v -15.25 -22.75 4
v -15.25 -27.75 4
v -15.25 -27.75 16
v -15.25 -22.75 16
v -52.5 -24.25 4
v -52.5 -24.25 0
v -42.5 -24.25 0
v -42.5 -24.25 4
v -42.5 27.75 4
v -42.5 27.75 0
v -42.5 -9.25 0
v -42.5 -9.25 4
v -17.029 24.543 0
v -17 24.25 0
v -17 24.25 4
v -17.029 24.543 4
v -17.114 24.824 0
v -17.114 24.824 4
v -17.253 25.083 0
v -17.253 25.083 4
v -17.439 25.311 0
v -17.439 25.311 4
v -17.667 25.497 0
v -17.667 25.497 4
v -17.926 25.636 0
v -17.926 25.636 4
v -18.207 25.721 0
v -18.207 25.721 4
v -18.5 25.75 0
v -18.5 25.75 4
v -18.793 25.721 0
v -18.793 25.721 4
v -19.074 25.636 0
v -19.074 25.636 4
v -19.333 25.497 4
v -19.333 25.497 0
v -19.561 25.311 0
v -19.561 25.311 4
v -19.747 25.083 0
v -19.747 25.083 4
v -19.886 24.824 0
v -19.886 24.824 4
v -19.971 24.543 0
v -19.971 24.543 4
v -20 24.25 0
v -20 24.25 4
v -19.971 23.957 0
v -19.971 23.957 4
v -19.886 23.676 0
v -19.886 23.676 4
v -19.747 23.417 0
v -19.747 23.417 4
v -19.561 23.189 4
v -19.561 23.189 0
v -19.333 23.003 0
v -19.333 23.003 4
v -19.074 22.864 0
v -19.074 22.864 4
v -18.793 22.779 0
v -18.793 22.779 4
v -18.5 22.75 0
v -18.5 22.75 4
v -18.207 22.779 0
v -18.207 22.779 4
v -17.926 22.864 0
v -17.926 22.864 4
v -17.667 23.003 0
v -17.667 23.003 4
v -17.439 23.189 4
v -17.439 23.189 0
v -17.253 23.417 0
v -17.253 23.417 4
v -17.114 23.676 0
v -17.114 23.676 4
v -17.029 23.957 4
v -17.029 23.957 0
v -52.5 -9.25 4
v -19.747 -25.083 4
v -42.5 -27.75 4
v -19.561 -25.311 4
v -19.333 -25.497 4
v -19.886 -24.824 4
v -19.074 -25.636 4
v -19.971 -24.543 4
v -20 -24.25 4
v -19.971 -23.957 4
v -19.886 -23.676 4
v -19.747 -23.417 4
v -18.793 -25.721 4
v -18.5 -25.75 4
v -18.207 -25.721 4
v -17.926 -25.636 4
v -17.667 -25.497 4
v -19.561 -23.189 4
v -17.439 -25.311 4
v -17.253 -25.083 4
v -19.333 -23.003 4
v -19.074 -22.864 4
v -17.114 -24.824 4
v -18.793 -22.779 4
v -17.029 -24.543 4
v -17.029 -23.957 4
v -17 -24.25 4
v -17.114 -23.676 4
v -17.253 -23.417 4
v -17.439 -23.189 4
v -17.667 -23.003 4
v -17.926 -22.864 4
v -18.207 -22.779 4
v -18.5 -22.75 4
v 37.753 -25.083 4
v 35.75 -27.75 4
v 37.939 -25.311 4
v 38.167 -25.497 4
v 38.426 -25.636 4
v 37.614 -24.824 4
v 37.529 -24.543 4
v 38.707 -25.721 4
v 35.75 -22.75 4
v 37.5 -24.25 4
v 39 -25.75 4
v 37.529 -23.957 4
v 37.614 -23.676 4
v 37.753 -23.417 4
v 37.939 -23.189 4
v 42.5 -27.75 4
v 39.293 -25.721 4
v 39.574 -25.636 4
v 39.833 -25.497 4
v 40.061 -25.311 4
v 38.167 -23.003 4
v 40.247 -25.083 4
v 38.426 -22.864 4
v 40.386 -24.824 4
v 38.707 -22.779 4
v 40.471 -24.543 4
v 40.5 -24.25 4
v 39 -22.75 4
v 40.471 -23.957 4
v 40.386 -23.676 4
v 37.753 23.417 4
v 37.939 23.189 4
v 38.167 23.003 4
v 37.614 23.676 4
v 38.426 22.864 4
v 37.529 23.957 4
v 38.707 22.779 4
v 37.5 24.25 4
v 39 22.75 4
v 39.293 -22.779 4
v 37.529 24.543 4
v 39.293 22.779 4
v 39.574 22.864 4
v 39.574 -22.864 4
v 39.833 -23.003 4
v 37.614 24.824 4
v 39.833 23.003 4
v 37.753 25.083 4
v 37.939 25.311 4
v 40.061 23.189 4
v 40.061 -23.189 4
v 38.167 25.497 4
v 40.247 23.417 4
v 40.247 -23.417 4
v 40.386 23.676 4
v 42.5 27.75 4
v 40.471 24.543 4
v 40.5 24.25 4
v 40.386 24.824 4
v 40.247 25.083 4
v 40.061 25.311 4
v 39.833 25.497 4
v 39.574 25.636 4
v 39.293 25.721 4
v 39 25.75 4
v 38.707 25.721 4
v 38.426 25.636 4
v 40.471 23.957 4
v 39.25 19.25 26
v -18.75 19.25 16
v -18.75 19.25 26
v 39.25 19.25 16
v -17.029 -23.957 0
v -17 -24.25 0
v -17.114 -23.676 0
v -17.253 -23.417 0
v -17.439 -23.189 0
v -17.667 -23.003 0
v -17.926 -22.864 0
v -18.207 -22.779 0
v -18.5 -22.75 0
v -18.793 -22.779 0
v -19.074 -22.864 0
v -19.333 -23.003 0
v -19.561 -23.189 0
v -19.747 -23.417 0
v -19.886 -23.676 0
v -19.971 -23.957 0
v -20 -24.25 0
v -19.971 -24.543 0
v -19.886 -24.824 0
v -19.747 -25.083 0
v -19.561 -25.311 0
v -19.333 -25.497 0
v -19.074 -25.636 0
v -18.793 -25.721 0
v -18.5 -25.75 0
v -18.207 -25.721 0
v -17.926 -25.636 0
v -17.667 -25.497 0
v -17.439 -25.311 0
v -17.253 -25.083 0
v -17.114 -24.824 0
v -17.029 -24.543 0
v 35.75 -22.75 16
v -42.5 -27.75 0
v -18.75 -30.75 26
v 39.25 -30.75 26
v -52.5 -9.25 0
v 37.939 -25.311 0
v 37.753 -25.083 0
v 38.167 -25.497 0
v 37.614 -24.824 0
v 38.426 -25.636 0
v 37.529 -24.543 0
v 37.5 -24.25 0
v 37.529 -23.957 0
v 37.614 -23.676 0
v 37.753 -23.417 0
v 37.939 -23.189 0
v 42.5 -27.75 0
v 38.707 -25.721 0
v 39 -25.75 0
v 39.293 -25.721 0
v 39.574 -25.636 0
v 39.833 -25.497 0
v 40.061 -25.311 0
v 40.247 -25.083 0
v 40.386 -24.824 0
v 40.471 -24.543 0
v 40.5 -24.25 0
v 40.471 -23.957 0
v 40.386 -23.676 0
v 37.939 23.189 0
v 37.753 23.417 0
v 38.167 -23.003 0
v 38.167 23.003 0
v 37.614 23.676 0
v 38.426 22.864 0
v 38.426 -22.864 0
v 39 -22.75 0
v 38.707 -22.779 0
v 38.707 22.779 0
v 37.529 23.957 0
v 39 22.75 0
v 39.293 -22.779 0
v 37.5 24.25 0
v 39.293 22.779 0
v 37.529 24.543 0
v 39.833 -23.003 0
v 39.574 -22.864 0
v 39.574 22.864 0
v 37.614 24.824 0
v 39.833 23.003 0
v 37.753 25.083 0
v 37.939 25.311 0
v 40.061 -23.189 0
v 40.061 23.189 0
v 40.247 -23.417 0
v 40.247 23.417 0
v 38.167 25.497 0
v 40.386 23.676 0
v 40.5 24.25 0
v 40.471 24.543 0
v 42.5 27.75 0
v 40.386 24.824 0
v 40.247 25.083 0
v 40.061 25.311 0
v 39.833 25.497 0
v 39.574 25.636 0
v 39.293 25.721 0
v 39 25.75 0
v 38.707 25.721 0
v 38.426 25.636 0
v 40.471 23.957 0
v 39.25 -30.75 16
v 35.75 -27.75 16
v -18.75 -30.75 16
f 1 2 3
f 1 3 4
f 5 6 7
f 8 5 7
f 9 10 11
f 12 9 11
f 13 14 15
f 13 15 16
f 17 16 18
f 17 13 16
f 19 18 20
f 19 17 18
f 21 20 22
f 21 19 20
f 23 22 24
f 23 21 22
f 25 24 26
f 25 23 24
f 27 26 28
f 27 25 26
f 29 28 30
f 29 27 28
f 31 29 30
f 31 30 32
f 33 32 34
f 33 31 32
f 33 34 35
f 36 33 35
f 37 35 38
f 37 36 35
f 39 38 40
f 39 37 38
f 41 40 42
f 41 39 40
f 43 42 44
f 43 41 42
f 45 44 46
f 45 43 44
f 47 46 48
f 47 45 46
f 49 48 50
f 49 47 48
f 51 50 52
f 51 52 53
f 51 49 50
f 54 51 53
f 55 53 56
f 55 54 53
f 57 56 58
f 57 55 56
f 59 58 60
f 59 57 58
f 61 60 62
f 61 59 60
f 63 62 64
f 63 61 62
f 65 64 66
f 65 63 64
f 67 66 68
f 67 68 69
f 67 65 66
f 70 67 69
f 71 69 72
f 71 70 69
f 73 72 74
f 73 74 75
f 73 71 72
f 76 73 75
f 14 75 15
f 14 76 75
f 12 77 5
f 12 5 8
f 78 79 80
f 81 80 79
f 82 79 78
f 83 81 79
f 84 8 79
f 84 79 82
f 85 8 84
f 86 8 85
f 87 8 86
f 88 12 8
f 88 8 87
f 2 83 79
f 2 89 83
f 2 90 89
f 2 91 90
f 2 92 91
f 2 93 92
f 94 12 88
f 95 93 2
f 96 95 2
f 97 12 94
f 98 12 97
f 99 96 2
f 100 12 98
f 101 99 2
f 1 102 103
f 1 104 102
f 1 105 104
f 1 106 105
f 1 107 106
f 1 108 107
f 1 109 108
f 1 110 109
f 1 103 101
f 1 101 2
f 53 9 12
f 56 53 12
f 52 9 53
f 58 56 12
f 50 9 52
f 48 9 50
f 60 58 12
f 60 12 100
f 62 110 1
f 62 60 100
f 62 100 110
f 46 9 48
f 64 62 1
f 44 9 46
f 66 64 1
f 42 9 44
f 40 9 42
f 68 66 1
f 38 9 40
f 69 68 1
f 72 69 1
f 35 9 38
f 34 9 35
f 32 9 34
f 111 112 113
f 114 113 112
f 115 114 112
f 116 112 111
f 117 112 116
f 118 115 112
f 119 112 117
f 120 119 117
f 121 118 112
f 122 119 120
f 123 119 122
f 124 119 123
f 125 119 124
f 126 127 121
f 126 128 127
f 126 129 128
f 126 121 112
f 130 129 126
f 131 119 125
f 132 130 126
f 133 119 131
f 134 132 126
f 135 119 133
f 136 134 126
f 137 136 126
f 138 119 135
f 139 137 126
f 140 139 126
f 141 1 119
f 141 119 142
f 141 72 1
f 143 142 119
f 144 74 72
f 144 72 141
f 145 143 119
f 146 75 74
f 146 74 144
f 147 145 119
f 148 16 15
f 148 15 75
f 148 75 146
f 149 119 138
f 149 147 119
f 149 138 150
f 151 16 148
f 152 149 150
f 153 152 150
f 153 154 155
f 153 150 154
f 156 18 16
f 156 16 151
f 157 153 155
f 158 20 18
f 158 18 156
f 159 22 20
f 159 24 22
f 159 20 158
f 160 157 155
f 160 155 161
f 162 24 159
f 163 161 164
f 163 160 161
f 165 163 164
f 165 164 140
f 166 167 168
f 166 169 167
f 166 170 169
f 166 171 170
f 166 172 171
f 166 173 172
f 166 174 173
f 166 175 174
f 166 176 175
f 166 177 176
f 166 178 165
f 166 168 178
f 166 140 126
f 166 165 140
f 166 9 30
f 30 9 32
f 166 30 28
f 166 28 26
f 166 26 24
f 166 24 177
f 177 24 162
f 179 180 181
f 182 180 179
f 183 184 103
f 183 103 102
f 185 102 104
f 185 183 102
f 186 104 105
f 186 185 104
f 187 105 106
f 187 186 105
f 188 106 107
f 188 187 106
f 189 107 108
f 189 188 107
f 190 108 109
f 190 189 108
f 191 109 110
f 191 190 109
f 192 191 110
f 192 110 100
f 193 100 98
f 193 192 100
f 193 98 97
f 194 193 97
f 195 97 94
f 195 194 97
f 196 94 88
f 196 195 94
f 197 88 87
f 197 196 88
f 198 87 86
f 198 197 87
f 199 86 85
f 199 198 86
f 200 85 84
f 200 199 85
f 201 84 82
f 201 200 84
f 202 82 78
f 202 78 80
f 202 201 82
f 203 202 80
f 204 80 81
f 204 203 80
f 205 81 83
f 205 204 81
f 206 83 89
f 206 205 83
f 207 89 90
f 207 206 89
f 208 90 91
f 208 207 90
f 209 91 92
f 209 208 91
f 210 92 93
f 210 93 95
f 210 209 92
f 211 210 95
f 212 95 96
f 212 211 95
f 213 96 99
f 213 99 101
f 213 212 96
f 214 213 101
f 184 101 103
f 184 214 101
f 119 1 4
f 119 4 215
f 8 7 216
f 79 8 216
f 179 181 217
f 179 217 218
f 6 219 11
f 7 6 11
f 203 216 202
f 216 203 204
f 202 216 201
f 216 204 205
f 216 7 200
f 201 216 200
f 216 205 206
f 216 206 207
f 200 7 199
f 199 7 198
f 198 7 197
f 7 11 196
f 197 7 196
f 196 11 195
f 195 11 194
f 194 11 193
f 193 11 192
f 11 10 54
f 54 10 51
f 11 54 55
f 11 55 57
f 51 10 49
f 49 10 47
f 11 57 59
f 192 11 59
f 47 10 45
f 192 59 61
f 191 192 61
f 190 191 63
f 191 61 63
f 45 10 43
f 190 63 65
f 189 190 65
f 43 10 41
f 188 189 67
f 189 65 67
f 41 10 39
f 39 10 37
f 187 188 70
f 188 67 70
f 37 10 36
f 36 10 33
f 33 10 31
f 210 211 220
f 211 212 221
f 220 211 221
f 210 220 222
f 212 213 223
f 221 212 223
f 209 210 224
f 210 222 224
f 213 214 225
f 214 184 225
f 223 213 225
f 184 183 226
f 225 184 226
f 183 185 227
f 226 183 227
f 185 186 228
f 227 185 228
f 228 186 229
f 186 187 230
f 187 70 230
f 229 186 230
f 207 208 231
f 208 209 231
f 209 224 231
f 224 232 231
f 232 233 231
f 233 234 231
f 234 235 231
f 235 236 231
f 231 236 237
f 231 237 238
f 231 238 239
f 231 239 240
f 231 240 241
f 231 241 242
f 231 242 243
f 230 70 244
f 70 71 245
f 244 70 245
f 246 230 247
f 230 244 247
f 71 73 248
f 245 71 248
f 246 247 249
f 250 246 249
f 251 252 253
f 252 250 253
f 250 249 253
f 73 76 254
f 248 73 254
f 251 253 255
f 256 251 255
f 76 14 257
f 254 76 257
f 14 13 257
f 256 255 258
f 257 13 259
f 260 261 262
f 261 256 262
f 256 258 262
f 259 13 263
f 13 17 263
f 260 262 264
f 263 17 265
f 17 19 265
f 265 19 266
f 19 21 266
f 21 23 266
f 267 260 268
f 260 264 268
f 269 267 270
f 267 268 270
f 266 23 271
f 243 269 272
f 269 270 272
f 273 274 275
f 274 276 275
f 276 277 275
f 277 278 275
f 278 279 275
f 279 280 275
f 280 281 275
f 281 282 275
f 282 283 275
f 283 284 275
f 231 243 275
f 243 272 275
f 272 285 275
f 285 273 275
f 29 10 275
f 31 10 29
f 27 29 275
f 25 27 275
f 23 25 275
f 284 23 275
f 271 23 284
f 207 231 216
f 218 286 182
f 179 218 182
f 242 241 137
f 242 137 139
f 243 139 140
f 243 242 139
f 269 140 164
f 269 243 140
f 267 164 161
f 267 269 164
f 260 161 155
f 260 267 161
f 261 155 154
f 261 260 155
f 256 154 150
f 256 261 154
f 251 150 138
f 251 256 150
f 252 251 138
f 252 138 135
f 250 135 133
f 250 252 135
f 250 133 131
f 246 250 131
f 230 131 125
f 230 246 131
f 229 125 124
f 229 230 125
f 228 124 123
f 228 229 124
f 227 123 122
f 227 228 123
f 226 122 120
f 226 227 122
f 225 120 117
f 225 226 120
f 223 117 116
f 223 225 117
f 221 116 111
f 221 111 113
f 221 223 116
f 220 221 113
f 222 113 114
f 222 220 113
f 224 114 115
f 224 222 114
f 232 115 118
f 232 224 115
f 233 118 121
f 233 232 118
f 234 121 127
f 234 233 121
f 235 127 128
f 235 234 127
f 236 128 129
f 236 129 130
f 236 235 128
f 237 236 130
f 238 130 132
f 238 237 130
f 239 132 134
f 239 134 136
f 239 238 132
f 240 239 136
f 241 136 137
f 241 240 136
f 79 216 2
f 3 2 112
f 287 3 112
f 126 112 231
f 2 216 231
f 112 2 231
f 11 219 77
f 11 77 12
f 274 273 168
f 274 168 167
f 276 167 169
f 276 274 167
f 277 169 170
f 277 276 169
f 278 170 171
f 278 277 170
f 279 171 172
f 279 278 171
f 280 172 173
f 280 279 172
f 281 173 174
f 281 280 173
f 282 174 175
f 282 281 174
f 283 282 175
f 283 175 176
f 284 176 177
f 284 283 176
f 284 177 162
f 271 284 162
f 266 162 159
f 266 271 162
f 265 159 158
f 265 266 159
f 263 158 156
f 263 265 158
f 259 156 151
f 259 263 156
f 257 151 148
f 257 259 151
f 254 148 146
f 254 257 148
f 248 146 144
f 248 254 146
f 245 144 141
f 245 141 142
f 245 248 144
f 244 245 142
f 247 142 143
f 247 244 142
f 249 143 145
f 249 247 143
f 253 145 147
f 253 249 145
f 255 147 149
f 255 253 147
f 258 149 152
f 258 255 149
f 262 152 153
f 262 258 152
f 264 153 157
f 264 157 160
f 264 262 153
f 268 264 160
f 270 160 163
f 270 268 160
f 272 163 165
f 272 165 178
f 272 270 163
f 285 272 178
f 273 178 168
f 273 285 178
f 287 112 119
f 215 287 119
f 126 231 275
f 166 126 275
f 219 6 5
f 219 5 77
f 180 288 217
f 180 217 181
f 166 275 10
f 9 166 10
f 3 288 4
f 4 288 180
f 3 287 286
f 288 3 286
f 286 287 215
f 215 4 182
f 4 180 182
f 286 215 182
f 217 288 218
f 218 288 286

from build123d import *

# Parameters (mm, degrees)
F0_R     = 1.5
F0_W     = 10
F0_H     = 15
F1_DEPTH = 4
F2_W     = 51
F2_H     = 5
F3_DEPTH = 12
F4_W     = 58
F4_H     = 50
F5_DEPTH = 10


with BuildPart() as f1:
    # F0 (on Top) → F1 (new body)
    with BuildSketch(Plane.XY):
        Polygon((42.5, 27.75), (-42.5, 27.75), (-42.5, -9.25), (-42.5, -24.25), (-42.5, -27.75), (42.5, -27.75), align=None)
        with Locations((-18.5, -24.25)):
            Circle(F0_R, mode=Mode.SUBTRACT)
        with Locations((39, -24.25)):
            Circle(F0_R, mode=Mode.SUBTRACT)
        with Locations((-18.5, 24.25)):
            Circle(F0_R, mode=Mode.SUBTRACT)
        with Locations((39, 24.25)):
            Circle(F0_R, mode=Mode.SUBTRACT)
        with Locations((-47.5, -16.75)):
            Rectangle(F0_W, F0_H)
    extrude(amount=F1_DEPTH)

    # F2 (on face) → F3 (join)
    with BuildSketch(Plane.XY.offset(4)):
        with Locations((10.25, -25.25)):
            Rectangle(F2_W, F2_H)
    extrude(amount=F3_DEPTH)

    # F4 (on face) → F5 (join)
    with BuildSketch(Plane.XY.offset(16)):
        with Locations((10.25, -5.75)):
            Rectangle(F4_W, F4_H)
    extrude(amount=F5_DEPTH)


solid = f1.part
